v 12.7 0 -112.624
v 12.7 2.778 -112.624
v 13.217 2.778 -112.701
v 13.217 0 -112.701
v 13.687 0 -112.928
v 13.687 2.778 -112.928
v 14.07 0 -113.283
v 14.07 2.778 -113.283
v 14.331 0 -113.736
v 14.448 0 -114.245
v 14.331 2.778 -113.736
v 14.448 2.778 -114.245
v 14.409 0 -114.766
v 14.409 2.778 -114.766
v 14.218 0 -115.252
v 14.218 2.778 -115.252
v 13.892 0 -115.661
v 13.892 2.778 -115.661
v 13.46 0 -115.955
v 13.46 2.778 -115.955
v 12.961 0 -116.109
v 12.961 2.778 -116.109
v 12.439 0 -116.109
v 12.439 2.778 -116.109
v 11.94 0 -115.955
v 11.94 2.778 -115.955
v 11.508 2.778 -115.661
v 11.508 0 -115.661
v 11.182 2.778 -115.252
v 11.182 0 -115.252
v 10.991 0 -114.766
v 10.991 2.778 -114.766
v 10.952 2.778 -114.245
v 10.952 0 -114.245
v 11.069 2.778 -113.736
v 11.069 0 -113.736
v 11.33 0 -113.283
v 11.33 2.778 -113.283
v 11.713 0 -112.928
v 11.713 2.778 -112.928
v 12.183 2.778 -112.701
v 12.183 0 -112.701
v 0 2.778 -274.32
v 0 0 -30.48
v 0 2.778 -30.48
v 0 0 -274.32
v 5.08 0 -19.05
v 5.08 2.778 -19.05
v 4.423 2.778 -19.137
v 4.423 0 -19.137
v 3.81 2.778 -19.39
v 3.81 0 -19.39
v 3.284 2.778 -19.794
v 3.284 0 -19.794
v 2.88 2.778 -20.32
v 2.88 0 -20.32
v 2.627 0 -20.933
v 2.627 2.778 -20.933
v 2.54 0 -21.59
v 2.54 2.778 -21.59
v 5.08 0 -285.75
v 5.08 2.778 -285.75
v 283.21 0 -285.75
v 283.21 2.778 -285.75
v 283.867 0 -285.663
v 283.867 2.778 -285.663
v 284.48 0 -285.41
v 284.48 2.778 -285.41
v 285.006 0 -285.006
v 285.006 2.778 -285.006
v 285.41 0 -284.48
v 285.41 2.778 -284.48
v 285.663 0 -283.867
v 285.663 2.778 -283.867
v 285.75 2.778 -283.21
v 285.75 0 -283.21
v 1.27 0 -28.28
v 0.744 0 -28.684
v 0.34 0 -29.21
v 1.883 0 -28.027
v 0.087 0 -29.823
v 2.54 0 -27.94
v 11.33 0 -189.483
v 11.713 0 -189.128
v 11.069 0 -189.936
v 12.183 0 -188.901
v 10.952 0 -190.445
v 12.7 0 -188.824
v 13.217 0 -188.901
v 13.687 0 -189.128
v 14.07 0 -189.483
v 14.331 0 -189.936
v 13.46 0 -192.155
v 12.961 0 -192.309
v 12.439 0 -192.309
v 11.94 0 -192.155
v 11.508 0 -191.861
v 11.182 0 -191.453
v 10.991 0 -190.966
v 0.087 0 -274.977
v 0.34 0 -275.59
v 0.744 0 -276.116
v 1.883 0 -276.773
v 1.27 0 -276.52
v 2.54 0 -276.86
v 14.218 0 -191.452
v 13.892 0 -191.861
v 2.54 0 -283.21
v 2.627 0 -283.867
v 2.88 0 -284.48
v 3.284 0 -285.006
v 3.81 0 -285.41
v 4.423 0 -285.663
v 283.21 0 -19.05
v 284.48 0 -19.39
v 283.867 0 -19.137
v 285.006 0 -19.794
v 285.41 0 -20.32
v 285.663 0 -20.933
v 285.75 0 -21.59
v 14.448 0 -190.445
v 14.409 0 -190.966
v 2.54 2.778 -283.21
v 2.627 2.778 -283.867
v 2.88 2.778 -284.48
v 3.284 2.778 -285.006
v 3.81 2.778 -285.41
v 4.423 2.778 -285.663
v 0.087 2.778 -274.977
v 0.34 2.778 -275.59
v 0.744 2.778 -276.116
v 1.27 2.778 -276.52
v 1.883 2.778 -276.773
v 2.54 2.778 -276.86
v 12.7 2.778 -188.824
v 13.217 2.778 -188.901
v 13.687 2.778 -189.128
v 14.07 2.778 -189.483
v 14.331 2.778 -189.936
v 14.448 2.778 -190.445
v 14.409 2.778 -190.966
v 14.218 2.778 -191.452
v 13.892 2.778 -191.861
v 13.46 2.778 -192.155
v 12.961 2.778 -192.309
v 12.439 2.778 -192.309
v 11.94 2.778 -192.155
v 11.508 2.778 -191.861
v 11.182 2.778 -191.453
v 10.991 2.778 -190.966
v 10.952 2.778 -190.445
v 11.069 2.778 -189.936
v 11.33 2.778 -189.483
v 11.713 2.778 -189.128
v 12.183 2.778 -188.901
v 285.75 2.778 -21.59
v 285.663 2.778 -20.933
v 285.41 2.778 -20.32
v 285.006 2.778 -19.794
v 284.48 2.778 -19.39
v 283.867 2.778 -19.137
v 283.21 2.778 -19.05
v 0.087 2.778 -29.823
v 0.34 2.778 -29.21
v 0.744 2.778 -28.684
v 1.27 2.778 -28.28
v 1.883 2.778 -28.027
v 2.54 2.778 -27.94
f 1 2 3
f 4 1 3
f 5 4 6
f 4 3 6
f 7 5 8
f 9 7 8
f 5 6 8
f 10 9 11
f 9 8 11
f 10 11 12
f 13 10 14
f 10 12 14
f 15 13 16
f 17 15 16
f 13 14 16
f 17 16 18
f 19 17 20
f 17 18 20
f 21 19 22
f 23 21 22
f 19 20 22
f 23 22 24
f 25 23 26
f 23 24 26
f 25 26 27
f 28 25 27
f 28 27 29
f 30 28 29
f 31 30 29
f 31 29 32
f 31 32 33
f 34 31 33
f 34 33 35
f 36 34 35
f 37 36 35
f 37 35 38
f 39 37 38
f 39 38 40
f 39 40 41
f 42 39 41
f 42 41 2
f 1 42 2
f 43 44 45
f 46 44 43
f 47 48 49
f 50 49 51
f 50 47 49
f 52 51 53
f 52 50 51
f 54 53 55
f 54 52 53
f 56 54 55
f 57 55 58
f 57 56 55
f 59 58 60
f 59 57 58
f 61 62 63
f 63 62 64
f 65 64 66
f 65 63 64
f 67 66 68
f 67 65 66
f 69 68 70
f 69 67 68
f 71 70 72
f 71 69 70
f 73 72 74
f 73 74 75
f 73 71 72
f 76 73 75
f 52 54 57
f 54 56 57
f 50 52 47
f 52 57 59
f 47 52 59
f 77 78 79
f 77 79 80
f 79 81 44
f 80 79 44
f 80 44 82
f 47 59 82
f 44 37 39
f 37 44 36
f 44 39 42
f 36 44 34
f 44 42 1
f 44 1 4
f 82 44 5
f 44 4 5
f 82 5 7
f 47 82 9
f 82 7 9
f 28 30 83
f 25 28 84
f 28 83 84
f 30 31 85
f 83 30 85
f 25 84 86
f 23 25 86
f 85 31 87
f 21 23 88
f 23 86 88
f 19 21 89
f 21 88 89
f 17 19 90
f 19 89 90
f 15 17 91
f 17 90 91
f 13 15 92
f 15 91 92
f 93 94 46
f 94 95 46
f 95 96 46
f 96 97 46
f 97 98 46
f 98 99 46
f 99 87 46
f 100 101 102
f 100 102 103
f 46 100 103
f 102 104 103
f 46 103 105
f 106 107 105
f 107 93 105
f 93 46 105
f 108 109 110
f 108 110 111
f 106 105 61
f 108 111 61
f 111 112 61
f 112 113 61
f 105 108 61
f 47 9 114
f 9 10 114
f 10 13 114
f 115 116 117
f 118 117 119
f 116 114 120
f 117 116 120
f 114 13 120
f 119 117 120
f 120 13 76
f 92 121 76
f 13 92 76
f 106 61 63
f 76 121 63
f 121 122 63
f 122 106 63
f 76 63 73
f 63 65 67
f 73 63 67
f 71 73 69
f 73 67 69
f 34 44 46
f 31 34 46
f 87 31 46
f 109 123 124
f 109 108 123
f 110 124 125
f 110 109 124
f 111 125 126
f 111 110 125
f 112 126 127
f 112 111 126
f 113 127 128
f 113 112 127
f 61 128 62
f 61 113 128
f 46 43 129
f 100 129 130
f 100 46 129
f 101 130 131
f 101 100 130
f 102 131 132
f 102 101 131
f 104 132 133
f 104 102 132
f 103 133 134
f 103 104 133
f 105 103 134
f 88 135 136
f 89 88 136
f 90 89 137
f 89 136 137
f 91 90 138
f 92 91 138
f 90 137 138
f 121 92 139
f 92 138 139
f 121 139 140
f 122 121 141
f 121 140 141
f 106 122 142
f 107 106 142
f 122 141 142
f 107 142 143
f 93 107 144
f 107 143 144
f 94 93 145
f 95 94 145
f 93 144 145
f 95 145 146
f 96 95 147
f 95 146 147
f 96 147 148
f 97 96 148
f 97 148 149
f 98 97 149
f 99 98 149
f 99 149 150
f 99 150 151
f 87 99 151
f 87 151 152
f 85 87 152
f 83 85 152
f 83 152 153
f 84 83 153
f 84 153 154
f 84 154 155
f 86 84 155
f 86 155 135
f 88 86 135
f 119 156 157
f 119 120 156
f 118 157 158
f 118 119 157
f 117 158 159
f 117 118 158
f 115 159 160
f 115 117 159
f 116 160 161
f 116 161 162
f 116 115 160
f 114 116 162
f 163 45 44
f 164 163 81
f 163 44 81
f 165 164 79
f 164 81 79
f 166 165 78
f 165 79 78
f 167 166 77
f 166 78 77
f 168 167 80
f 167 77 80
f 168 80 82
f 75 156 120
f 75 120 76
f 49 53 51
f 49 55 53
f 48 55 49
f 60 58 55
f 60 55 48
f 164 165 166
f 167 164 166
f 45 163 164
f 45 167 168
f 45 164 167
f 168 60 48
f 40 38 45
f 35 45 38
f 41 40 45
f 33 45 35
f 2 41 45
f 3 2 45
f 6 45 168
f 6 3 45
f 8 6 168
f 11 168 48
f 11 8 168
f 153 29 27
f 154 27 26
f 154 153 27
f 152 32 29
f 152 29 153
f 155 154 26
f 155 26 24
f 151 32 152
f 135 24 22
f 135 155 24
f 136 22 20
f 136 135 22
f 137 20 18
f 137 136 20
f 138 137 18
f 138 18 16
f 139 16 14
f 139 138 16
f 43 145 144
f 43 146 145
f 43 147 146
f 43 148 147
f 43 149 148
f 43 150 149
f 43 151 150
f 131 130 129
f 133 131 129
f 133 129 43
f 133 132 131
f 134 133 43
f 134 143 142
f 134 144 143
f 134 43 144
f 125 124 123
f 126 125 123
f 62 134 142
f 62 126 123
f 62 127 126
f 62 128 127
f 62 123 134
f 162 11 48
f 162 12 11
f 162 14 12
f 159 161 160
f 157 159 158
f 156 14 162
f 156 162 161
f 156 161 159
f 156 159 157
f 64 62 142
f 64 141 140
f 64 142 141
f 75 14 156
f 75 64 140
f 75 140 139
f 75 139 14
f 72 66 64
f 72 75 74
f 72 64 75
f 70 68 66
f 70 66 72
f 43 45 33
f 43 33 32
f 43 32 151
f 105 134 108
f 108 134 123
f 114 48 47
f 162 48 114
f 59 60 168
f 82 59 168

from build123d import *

# Parameters (mm, degrees)
SKETCH1_W           = 304.8
SKETCH1_H           = 304.8
BOSS_EXTRUDE1_DEPTH = 2.778125
SKETCH2_W           = 304.8
SKETCH2_H           = 19.05
CUT_EXTRUDE1_DEPTH  = 432.061246204
SKETCH4_R           = 1.7526
CUT_EXTRUDE3_DEPTH  = 418.808353768
SKETCH5_W           = 19.05
SKETCH5_H           = 266.7
CUT_EXTRUDE4_DEPTH  = 418.808353768
SKETCH6_W           = 2.54
SKETCH6_H           = 8.89
CUT_EXTRUDE5_DEPTH  = 405.121074653
FILLET1_R           = 2.54


with BuildPart() as part:
    # Sketch1 → Boss-Extrude1 (new body)
    with BuildSketch(Plane(origin=(0, 0, 0), x_dir=(1, 0, 0), z_dir=(0, 1, 0))):
        with Locations((152.4, 152.4)):
            Rectangle(SKETCH1_W, SKETCH1_H)
    extrude(amount=BOSS_EXTRUDE1_DEPTH)

    # Sketch2 → Cut-Extrude1 (cut, through all)
    with BuildSketch(Plane(origin=(0, 2.778125, 0), x_dir=(1, 0, 0), z_dir=(0, 1, 0))):
        with Locations((152.4, 9.525)):
            Rectangle(SKETCH2_W, SKETCH2_H)
        with Locations((152.4, 295.275)):
            Rectangle(SKETCH2_W, SKETCH2_H)
    extrude(amount=-CUT_EXTRUDE1_DEPTH, mode=Mode.SUBTRACT)

    # Sketch4 → Cut-Extrude3 (cut, through all)
    with BuildSketch(Plane(origin=(0, 2.778125, 0), x_dir=(1, 0, 0), z_dir=(0, 1, 0))):
        with Locations(Location((12.7, 190.5762, 0), (0, 0, 270))):
            Circle(SKETCH4_R)
        with Locations(Location((12.7, 114.3762, 0), (0, 0, 270))):
            Circle(SKETCH4_R)
    extrude(amount=-CUT_EXTRUDE3_DEPTH, mode=Mode.SUBTRACT)

    # Sketch5 → Cut-Extrude4 (cut, through all)
    with BuildSketch(Plane(origin=(0, 2.778125, 0), x_dir=(1, 0, 0), z_dir=(0, 1, 0))):
        with Locations((295.275, 152.4)):
            Rectangle(SKETCH5_W, SKETCH5_H)
    extrude(amount=-CUT_EXTRUDE4_DEPTH, mode=Mode.SUBTRACT)

    # Sketch6 → Cut-Extrude5 (cut, through all)
    with BuildSketch(Plane(origin=(0, 2.778125, 0), x_dir=(1, 0, 0), z_dir=(0, 1, 0))):
        with Locations((1.27, 281.305)):
            Rectangle(SKETCH6_W, SKETCH6_H)
        with Locations((1.27, 23.495)):
            Rectangle(SKETCH6_W, SKETCH6_H)
    extrude(amount=-CUT_EXTRUDE5_DEPTH, mode=Mode.SUBTRACT)

    # Fillet1
    fillet1_edges = [part.edges().sort_by_distance(p)[0] for p in [
        (285.75, 1.3890625, -19.05),
        (285.75, 1.3890625, -285.75),
        (0, 1.3890625, -276.86),
        (2.54, 1.3890625, -285.75),
        (2.54, 1.3890625, -19.05),
        (0, 1.3890625, -27.94),
    ]]
    fillet(fillet1_edges, radius=FILLET1_R - 0.0001)  # a hair under: the kernel refuses the full size


solid = part.part
